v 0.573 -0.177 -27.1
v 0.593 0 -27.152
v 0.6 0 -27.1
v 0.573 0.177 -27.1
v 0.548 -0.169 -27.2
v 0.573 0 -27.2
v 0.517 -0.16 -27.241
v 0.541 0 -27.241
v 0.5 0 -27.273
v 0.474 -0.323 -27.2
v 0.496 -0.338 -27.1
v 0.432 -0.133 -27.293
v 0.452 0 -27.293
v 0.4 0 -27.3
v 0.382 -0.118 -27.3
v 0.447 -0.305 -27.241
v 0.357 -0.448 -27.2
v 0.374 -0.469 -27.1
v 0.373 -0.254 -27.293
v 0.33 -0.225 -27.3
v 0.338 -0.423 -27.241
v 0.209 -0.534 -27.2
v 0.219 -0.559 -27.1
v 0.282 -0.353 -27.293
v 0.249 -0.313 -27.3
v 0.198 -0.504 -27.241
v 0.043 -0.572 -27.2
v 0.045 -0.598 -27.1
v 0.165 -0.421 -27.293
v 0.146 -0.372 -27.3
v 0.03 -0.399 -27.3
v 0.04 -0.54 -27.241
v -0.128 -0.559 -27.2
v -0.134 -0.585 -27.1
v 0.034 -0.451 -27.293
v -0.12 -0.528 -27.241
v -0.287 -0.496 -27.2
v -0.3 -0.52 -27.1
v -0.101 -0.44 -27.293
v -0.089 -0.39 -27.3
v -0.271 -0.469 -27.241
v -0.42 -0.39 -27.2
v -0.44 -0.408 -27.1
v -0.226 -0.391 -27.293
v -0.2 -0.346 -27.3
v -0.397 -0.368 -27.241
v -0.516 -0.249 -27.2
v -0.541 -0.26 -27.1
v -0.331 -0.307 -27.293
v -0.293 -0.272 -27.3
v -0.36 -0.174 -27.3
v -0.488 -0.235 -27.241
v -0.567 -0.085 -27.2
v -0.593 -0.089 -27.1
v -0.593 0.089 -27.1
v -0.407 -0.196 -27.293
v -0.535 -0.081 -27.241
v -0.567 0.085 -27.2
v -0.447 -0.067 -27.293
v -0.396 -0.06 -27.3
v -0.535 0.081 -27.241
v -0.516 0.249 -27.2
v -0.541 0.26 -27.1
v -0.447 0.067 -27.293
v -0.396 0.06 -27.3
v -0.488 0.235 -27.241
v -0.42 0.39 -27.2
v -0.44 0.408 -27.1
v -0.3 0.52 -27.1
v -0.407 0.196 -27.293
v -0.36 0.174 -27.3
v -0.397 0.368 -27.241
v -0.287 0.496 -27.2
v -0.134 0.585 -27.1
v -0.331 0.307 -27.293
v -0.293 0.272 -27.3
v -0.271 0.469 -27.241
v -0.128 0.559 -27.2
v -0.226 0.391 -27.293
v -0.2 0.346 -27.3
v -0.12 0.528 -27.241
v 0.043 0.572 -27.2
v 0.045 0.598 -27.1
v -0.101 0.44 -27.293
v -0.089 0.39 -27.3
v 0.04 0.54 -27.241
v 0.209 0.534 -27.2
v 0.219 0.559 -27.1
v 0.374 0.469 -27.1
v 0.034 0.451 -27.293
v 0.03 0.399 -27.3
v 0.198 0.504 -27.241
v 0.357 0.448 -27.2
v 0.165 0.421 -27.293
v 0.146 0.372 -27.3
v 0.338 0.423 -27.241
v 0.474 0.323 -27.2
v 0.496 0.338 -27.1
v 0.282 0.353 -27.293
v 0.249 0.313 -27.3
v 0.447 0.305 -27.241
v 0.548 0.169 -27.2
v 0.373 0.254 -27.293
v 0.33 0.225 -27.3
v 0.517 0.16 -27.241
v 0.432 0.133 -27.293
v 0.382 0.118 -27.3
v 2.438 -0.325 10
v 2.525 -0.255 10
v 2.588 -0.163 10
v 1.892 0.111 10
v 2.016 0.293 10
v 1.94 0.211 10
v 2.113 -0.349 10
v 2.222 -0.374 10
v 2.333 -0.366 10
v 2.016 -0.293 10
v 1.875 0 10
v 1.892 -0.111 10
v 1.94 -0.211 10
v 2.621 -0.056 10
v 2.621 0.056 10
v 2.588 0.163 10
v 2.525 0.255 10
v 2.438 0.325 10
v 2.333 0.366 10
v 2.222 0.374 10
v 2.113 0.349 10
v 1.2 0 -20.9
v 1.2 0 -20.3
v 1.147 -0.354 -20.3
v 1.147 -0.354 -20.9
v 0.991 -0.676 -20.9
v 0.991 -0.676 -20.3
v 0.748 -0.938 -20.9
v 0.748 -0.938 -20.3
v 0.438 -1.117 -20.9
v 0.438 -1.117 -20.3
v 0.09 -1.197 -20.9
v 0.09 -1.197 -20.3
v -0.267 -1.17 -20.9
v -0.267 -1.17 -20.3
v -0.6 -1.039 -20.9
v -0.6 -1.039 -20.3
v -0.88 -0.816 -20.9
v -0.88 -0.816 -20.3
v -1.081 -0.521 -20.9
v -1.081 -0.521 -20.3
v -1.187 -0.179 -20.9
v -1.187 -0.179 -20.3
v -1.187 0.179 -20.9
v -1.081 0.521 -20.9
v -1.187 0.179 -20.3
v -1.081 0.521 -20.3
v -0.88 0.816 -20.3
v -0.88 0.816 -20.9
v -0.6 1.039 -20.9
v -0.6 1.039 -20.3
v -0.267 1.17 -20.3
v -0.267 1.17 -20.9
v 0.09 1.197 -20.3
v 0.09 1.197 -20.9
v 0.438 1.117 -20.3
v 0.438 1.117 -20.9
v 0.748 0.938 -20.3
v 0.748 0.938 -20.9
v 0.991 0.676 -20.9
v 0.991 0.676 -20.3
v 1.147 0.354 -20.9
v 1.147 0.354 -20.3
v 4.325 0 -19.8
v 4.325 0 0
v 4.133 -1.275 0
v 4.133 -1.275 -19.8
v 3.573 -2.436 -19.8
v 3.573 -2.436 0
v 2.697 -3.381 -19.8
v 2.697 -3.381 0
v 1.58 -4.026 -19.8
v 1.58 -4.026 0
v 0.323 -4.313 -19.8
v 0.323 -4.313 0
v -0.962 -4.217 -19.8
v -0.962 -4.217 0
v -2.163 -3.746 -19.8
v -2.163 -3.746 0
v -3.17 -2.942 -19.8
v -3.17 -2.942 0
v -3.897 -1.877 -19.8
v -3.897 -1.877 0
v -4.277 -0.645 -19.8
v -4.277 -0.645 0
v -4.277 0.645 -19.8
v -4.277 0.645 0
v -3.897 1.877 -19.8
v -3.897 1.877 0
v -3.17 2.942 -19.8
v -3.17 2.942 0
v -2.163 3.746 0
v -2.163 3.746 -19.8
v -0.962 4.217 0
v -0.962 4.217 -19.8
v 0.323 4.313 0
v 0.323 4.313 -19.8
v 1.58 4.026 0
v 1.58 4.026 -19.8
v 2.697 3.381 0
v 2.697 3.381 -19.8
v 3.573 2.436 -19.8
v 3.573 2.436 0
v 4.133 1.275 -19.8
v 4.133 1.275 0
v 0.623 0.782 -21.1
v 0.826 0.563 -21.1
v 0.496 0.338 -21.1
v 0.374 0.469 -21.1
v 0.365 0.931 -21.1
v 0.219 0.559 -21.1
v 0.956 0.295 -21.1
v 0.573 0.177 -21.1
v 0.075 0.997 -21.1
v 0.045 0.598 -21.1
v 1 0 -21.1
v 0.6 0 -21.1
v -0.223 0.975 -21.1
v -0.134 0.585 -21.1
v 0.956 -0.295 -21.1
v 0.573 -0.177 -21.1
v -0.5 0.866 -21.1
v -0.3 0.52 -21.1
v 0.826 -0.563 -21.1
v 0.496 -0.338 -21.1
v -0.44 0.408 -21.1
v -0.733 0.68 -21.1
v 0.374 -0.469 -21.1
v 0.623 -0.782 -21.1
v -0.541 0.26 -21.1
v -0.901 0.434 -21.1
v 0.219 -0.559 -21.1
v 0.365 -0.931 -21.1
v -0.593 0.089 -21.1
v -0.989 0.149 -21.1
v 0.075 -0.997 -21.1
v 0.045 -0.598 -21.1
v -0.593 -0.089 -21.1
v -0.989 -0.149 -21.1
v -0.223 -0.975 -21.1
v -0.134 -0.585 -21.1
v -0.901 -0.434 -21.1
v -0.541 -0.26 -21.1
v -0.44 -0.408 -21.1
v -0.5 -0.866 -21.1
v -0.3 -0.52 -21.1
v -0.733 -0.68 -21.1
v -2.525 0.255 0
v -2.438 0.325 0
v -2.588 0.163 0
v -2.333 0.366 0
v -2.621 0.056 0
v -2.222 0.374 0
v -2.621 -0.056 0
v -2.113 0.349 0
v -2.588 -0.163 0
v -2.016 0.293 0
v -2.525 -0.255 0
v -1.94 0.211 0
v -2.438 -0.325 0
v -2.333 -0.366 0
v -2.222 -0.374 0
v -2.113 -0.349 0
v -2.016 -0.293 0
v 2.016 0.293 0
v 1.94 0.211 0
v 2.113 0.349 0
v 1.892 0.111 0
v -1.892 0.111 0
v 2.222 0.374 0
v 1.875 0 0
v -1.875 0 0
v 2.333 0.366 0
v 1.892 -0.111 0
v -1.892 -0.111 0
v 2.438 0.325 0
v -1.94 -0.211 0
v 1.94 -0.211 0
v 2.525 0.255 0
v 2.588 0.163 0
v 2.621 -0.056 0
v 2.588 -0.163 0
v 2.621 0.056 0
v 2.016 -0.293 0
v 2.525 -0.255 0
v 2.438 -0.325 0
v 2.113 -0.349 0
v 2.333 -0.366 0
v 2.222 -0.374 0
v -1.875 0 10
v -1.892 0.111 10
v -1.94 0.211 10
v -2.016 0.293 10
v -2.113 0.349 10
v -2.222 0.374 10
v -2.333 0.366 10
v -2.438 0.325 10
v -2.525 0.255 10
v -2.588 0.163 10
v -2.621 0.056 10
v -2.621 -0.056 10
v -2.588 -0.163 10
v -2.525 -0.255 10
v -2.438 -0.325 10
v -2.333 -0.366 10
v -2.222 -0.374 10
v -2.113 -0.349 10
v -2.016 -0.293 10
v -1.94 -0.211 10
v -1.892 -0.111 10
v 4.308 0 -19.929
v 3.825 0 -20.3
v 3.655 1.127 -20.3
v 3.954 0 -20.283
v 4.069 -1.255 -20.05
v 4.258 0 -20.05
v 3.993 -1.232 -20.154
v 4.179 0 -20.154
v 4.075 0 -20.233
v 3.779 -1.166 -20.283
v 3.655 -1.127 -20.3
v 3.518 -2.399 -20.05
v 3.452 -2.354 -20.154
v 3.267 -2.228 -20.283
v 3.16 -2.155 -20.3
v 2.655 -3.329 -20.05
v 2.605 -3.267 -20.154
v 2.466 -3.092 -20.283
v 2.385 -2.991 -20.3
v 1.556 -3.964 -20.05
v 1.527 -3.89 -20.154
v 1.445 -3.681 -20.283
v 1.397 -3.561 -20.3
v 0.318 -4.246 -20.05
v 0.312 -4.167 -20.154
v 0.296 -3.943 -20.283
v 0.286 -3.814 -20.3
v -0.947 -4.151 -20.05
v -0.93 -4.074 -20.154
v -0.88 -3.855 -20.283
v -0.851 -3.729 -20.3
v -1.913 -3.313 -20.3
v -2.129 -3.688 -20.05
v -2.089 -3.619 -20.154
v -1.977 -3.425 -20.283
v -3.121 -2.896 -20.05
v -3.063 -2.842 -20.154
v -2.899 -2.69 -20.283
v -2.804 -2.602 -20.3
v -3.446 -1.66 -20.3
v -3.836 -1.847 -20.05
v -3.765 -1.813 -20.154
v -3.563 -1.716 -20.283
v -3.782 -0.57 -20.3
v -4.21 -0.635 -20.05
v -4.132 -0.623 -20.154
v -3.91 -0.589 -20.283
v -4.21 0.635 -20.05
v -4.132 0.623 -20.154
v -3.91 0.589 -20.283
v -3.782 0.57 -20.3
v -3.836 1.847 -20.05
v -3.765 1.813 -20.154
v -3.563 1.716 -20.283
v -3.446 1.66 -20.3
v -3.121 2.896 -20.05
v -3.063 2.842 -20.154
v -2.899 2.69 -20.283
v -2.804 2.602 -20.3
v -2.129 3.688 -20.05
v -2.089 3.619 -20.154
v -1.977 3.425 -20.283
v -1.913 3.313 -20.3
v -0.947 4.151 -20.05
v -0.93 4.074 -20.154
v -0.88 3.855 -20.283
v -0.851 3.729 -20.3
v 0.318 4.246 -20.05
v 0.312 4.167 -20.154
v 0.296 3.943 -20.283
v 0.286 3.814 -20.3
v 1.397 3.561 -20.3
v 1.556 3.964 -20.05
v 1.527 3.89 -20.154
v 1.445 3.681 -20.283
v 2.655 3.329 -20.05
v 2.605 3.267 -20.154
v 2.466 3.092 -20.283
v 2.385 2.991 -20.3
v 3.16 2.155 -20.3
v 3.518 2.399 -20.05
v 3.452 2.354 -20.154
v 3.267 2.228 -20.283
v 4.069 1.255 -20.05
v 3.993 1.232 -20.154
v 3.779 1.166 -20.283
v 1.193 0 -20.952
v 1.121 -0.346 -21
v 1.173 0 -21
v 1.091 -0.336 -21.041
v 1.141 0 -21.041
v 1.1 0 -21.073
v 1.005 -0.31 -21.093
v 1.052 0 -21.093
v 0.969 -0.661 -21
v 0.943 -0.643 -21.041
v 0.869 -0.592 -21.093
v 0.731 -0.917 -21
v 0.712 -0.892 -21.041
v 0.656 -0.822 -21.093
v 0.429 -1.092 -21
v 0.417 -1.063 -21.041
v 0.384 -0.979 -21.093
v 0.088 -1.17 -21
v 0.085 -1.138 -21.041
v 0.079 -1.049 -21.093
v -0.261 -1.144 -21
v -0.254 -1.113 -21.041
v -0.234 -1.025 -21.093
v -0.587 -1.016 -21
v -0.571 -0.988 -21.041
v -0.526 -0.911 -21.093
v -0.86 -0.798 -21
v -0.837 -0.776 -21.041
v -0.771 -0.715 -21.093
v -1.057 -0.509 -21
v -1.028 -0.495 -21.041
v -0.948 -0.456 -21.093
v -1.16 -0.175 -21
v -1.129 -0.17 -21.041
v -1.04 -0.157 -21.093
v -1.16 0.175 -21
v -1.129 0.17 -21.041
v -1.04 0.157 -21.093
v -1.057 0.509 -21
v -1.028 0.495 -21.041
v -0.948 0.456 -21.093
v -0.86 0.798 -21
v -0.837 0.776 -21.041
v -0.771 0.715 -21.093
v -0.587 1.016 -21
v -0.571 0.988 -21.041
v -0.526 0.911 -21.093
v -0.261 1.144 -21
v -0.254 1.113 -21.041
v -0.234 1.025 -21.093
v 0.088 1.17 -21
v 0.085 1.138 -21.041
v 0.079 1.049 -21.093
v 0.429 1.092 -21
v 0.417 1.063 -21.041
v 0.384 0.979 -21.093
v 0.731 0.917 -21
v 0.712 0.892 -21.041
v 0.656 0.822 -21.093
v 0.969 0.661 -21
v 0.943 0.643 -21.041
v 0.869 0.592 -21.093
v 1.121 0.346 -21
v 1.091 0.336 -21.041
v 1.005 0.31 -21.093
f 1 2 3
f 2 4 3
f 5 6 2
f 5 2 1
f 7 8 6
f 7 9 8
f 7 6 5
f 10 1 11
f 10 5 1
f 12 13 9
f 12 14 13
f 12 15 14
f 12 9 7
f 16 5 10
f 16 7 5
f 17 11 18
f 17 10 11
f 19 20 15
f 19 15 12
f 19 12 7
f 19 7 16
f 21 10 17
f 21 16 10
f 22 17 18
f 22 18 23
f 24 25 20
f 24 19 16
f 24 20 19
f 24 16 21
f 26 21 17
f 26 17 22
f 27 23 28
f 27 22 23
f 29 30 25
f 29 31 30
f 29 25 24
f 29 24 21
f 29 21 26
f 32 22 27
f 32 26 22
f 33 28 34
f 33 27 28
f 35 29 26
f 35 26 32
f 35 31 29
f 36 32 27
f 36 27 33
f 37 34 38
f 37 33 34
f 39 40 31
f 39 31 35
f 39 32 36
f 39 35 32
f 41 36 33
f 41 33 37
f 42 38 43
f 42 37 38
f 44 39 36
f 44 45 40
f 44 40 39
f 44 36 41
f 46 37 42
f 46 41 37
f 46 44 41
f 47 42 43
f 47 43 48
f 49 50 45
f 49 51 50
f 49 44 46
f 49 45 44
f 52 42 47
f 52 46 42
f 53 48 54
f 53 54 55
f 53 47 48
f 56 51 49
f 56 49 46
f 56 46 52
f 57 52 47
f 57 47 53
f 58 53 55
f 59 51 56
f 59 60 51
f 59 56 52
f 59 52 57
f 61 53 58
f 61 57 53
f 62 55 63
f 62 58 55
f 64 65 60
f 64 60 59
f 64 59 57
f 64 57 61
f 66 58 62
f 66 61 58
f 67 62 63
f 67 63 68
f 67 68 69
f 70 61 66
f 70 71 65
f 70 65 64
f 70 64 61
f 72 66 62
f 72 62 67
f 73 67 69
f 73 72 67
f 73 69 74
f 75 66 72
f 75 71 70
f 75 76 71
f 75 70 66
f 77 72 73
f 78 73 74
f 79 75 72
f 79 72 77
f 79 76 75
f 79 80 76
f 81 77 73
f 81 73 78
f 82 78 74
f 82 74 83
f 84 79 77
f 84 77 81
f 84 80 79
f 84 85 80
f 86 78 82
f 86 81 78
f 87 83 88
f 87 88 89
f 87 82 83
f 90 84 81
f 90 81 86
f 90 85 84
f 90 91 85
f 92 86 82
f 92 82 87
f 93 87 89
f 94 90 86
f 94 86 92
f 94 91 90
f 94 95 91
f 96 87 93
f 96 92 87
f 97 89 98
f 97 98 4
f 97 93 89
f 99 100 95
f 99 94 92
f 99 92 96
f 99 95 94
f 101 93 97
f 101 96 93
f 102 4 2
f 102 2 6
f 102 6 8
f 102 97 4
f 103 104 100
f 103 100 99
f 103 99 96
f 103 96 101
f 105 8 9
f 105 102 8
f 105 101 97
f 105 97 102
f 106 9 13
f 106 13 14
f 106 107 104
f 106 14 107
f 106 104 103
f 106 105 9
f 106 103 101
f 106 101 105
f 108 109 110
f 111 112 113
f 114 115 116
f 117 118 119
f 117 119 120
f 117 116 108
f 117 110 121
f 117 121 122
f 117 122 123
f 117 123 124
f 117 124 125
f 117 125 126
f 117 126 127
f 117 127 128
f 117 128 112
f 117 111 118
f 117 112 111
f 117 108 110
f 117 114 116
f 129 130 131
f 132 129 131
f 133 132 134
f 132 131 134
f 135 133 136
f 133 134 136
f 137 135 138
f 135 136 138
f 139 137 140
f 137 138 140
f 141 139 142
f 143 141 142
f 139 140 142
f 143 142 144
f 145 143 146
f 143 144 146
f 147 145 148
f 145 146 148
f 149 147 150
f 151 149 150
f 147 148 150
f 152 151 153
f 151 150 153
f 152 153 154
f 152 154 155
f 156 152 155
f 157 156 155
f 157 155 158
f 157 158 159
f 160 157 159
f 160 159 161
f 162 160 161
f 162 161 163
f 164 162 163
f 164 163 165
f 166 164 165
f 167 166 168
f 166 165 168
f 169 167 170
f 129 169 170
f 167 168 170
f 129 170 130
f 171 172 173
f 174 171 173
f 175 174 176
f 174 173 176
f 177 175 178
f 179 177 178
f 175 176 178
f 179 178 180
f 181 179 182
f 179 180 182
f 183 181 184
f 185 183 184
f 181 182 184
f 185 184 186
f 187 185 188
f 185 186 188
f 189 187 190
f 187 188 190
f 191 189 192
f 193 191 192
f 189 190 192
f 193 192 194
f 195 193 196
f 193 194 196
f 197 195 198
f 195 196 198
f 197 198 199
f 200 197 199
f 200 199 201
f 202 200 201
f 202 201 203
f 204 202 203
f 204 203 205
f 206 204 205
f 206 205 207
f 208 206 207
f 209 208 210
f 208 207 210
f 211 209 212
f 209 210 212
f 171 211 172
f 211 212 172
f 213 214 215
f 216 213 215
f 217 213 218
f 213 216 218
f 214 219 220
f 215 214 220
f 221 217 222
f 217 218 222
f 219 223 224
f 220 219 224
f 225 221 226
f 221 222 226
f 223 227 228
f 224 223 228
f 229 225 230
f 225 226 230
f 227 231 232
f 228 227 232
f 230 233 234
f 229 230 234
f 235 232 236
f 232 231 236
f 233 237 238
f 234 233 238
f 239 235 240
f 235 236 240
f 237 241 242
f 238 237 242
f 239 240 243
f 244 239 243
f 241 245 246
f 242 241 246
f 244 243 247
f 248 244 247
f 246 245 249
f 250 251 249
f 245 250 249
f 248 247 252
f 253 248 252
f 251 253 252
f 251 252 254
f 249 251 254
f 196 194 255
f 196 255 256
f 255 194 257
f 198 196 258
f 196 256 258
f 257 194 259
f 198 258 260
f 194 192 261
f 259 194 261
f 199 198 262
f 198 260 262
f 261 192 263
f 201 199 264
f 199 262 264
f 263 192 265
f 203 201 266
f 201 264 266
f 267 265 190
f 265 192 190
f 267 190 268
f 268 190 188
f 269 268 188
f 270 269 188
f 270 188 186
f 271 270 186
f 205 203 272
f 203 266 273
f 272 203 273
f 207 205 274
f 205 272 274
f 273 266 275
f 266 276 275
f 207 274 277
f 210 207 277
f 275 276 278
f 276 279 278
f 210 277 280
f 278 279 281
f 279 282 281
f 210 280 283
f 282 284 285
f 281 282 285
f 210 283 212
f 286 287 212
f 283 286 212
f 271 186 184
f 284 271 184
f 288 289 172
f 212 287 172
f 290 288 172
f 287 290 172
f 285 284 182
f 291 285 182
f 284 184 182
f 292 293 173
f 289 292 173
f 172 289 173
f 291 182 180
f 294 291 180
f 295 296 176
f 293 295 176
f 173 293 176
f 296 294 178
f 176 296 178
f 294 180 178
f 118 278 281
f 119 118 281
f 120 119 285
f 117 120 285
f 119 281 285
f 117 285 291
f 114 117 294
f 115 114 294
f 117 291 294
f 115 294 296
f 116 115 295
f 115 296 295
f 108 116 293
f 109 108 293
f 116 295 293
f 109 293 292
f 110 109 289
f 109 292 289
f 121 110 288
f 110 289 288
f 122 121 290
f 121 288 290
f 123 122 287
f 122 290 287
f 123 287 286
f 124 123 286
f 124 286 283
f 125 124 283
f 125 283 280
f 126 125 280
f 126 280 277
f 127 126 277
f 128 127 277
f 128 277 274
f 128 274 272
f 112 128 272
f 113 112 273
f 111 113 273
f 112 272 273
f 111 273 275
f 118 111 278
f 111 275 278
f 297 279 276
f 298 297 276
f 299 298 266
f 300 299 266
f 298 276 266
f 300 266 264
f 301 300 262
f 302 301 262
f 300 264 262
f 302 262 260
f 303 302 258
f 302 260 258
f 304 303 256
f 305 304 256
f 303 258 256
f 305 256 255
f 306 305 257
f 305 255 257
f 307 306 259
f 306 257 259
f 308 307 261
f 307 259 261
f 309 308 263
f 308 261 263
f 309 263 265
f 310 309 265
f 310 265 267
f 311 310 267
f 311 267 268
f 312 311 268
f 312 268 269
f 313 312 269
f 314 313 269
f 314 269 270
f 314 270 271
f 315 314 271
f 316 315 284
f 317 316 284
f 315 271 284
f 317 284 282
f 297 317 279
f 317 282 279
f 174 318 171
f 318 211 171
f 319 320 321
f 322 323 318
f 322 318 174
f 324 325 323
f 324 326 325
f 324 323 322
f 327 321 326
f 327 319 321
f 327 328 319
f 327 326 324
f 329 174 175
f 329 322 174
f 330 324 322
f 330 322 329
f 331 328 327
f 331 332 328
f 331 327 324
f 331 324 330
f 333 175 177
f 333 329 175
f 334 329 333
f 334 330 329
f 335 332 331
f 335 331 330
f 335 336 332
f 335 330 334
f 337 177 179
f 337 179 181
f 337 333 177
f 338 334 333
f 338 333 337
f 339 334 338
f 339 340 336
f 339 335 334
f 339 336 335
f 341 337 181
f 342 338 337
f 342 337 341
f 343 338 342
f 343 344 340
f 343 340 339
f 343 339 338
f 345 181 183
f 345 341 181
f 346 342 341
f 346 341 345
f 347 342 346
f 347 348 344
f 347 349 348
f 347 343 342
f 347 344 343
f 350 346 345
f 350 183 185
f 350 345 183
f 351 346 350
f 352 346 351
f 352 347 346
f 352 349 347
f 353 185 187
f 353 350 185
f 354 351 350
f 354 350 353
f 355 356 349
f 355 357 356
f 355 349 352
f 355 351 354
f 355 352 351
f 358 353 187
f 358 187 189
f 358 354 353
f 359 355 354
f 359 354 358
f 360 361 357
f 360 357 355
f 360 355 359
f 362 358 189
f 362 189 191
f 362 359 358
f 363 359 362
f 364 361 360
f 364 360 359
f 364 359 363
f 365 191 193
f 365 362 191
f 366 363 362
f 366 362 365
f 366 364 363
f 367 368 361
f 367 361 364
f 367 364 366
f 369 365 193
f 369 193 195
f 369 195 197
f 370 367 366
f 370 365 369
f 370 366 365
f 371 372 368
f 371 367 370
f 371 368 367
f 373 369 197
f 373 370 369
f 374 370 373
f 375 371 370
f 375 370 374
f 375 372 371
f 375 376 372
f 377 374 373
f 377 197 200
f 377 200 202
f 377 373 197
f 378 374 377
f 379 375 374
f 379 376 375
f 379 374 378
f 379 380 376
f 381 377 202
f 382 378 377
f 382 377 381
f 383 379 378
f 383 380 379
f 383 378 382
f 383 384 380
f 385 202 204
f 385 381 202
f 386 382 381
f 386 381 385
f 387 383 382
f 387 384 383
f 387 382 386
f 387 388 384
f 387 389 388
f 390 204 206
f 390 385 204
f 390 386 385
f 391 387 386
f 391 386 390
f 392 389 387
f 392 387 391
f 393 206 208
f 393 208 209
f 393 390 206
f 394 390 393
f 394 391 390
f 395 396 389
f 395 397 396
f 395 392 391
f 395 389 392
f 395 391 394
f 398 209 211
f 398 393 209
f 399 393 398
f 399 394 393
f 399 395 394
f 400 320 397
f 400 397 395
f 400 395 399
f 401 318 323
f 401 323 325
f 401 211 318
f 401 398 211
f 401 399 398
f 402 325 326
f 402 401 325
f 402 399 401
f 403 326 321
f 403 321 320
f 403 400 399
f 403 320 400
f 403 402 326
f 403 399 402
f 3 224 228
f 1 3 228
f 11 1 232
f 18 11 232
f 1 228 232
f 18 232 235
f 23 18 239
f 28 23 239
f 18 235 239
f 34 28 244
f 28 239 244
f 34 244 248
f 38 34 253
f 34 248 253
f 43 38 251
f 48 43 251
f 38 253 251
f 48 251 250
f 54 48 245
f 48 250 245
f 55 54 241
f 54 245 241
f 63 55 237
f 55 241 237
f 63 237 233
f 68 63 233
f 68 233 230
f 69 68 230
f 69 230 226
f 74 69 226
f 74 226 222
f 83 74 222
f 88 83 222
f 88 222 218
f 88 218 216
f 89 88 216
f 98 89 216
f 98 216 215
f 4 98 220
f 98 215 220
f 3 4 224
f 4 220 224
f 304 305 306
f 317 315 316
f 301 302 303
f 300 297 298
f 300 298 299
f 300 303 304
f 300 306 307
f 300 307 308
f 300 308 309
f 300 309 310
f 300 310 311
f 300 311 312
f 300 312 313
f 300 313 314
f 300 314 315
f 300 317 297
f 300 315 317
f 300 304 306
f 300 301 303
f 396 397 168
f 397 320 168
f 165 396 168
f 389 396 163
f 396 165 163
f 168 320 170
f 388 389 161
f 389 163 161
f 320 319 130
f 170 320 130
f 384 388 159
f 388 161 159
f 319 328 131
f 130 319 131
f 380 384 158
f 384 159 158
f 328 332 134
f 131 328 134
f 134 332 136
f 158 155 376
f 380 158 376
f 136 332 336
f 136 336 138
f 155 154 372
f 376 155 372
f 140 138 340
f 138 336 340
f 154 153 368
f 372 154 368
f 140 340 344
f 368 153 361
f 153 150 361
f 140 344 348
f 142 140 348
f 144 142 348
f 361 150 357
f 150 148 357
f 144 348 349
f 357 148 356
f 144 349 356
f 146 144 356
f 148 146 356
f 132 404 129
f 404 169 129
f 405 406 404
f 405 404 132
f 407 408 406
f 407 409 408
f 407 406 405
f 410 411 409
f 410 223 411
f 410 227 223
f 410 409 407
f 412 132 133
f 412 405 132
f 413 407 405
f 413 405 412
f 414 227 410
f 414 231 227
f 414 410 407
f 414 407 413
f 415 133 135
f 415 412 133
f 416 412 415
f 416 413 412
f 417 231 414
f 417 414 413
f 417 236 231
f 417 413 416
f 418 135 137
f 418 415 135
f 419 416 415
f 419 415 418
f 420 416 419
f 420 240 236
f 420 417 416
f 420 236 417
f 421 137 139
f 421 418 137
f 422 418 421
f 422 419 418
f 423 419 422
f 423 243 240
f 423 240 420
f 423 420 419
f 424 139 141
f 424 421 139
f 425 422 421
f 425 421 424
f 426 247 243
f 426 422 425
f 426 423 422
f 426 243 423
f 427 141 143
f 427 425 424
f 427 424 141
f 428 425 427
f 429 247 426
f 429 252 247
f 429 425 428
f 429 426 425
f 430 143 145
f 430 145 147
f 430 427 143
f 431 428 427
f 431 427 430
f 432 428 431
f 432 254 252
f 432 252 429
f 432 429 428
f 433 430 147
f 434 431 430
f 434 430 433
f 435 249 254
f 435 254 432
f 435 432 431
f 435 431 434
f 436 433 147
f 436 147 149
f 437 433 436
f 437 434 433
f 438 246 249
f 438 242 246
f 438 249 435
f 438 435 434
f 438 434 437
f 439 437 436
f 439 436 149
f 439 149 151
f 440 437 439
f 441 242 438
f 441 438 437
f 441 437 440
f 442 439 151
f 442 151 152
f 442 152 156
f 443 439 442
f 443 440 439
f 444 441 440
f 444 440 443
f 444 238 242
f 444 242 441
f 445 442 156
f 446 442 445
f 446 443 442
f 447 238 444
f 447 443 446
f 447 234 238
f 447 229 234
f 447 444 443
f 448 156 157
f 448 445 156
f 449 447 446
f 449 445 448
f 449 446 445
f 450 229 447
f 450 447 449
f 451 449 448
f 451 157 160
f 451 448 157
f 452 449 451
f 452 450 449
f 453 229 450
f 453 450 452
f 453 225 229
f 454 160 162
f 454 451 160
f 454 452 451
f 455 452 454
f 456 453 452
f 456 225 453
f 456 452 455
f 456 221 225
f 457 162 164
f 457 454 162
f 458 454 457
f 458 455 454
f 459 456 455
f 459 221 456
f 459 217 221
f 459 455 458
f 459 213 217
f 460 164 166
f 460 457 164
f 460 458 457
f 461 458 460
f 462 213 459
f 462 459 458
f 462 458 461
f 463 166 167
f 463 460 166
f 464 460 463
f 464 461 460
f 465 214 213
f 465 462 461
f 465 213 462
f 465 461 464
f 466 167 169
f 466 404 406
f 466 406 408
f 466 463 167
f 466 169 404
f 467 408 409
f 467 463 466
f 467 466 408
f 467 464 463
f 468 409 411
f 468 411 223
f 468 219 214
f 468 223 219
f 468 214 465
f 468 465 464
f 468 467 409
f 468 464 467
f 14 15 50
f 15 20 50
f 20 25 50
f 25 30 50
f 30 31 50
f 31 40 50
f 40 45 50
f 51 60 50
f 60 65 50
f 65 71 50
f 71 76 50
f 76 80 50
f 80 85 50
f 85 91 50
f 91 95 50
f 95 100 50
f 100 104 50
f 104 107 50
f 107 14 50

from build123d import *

# Parameters (mm, degrees)
FILLET1_R           = 0.5
FILLET2_R           = 0.2
SKETCH2_R           = 0.375
BOSS_EXTRUDE1_DEPTH = 10


with BuildPart() as part:
    # Sketch1 → Revolve1 (revolve)
    with BuildSketch(Plane(origin=(0, 0, 0), x_dir=(1, 0, 0), z_dir=(0, 1, 0))):
        Polygon((4.325, 20.3), (4.325, 0), (0, 0), (0, 27.3), (0.6, 27.3), (0.6, 21.1), (1.2, 21.1), (1.2, 20.3), align=None)
    revolve(axis=Axis((0, 0, 0), (0, 0, -1)))

    # Fillet1
    fillet1_edges = [part.edges().sort_by_distance(p)[0] for p in [
        (-4.325, 0, -20.3),
    ]]
    fillet(fillet1_edges, radius=FILLET1_R)

    # Fillet2
    fillet2_edges = [part.edges().sort_by_distance(p)[0] for p in [
        (-1.2, 0, -21.1),
        (-0.6, 0, -27.3),
    ]]
    fillet(fillet2_edges, radius=FILLET2_R)

    # Sketch2 → Boss-Extrude1 (add)
    with BuildSketch(Plane.XY):
        with Locations((-2.25, 0)):
            Circle(SKETCH2_R)
        with Locations(Location((2.25, 0, 0), (0, 0, 180))):
            Circle(SKETCH2_R)
    extrude(amount=BOSS_EXTRUDE1_DEPTH)


solid = part.part
